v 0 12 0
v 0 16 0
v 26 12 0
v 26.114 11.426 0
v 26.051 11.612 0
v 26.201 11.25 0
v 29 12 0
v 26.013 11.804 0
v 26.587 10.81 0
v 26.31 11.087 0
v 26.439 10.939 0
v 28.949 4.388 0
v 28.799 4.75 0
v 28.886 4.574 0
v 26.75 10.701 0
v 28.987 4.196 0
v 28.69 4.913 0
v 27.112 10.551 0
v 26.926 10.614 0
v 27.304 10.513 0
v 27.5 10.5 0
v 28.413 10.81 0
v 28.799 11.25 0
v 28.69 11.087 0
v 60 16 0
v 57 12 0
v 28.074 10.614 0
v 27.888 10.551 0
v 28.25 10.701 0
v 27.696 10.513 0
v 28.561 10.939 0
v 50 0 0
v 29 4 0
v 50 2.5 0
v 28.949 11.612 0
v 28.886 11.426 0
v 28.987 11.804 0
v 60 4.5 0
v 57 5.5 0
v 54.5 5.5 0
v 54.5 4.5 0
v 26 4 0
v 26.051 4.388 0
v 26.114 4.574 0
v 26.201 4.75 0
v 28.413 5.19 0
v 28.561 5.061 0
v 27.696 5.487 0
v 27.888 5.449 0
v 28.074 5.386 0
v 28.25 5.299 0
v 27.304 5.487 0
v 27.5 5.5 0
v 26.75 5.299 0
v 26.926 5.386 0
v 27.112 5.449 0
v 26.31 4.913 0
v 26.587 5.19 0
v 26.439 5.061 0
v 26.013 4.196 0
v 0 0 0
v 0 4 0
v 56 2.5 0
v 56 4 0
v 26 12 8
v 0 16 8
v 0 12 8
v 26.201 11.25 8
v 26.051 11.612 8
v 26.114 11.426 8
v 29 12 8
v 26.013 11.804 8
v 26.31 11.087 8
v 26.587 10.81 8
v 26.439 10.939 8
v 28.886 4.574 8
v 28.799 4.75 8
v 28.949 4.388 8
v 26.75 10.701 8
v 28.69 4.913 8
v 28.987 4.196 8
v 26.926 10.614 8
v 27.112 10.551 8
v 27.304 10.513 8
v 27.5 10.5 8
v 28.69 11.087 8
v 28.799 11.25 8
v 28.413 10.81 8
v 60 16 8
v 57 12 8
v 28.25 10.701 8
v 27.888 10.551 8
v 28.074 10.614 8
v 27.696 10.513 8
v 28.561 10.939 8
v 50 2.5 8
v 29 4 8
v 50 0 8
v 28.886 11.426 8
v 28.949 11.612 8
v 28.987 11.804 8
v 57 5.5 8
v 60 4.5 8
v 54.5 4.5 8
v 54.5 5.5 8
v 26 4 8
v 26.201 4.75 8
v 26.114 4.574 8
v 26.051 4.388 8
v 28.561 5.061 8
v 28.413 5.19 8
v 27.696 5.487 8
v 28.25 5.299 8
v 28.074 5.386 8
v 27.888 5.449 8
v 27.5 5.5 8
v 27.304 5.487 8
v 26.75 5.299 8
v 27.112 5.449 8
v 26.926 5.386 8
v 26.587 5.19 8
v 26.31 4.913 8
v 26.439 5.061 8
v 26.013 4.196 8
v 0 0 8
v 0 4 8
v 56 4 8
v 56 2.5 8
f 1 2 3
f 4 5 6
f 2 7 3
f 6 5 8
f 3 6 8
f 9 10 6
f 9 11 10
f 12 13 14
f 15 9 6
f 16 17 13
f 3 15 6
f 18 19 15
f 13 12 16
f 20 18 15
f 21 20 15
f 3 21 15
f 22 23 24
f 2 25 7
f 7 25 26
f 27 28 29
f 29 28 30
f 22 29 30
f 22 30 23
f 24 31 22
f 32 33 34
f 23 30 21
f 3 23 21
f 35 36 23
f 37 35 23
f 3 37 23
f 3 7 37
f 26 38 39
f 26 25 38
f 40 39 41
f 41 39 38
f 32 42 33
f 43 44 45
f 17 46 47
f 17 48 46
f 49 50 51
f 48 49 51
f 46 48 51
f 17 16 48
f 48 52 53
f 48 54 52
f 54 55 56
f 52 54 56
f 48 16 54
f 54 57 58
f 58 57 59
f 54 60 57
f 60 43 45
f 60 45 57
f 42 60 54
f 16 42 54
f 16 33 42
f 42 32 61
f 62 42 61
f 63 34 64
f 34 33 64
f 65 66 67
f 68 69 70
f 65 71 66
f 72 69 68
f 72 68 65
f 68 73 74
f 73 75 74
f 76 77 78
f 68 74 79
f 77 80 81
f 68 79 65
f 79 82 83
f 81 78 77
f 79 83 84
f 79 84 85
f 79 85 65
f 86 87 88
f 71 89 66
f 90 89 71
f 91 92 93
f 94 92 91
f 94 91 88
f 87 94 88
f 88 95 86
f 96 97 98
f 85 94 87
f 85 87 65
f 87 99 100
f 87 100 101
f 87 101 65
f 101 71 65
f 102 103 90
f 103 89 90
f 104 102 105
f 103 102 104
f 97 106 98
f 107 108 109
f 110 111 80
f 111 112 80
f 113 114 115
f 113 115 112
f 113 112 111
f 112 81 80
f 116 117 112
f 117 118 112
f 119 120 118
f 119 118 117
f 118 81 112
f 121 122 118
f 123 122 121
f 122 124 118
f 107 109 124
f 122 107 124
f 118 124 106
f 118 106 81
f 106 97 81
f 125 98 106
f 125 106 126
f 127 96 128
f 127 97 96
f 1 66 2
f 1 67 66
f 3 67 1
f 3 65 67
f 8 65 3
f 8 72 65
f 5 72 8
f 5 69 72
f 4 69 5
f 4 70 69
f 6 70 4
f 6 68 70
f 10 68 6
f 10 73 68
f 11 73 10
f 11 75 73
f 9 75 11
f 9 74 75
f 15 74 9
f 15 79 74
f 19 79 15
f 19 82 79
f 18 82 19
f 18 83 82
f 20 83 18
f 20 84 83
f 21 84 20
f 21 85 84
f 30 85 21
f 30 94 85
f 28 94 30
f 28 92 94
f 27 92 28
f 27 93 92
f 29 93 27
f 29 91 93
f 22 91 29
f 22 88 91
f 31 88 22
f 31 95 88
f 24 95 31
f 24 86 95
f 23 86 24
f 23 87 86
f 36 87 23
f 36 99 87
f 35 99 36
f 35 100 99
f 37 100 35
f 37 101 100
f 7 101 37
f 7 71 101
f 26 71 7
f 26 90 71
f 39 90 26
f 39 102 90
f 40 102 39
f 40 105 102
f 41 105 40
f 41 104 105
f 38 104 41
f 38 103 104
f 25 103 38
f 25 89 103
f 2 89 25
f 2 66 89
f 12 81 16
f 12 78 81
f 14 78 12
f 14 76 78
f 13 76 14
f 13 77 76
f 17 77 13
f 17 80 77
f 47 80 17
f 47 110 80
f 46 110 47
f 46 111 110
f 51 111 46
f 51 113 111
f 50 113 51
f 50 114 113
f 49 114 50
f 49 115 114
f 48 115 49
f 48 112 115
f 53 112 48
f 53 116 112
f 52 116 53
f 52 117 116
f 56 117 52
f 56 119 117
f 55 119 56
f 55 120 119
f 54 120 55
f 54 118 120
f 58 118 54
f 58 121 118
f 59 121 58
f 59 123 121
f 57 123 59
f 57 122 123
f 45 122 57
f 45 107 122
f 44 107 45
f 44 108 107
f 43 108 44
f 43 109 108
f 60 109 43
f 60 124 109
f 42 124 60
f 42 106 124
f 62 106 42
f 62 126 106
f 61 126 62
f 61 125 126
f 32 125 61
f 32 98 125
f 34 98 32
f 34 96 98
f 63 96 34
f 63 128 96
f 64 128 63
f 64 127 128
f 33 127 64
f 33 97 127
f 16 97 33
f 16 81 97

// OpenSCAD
// KNOWN-WRONG PART (must fail): the hinge is missing (two loose jaws)
// Pinch clamp for silicone tubing (up to 6.4 mm OD) with a living hinge and a snap latch
// Category: quick fixes. One flat profile: two jaws joined by a 0.8 mm half-ring hinge, a
// half-round pinch ridge on each jaw, and a hook on the upper jaw whose nose snaps under the
// lower jaw's thin tongue when the jaws are squeezed together.
// Print: PETG or PP (PLA hinges crack), lying flat, 0.2 mm layers, 100 % infill.
// SPDX-License-Identifier: CERN-OHL-P-2.0

/* [Clamp] */
thickness = 8;            // extrusion along Z
lower_jaw = [50, 4];      // x 0..50, y 0..4
tongue = [50, 56, 2.5];   // x from, x to, y bottom (top at y = 4)
upper_jaw = [60, 12, 16]; // x 0..60, y 12..16
hinge_c = [0, 8];         // half-ring on the x < 0 side
hinge_r = [7.2, 8];       // inner, outer radius (0.8 mm thick)
ridge_x = 27.5;
ridge_r = 1.5;
leg = [57, 60, 4.5, 12];  // hook leg x from, x to, y from, y to
nose = [54.5, 57, 4.5, 5.5];

/* [Hidden] */
eps = 0.01;

linear_extrude(thickness) union() {
    square(lower_jaw);
    translate([tongue[0], tongue[2]]) square([tongue[1] - tongue[0], lower_jaw.y - tongue[2]]);
    translate([0, upper_jaw[1]]) square([upper_jaw[0], upper_jaw[2] - upper_jaw[1]]);
    if (false) intersection() {
        translate(hinge_c) difference() { circle(r = hinge_r[1], $fn = 128); circle(r = hinge_r[0], $fn = 128); }
        translate([-hinge_r[1] - 1, -1]) square([hinge_r[1] + 1 + eps, 2 * hinge_r[1] + 2]);
    }
    translate([ridge_x, lower_jaw.y]) circle(r = ridge_r, $fn = 48);
    translate([ridge_x, upper_jaw[1]]) circle(r = ridge_r, $fn = 48);
    translate([leg[0], leg[2]]) square([leg[1] - leg[0], leg[3] - leg[2] + eps]);
    translate([nose[0], nose[2]]) square([nose[1] - nose[0] + eps, nose[3] - nose[2]]);
}
